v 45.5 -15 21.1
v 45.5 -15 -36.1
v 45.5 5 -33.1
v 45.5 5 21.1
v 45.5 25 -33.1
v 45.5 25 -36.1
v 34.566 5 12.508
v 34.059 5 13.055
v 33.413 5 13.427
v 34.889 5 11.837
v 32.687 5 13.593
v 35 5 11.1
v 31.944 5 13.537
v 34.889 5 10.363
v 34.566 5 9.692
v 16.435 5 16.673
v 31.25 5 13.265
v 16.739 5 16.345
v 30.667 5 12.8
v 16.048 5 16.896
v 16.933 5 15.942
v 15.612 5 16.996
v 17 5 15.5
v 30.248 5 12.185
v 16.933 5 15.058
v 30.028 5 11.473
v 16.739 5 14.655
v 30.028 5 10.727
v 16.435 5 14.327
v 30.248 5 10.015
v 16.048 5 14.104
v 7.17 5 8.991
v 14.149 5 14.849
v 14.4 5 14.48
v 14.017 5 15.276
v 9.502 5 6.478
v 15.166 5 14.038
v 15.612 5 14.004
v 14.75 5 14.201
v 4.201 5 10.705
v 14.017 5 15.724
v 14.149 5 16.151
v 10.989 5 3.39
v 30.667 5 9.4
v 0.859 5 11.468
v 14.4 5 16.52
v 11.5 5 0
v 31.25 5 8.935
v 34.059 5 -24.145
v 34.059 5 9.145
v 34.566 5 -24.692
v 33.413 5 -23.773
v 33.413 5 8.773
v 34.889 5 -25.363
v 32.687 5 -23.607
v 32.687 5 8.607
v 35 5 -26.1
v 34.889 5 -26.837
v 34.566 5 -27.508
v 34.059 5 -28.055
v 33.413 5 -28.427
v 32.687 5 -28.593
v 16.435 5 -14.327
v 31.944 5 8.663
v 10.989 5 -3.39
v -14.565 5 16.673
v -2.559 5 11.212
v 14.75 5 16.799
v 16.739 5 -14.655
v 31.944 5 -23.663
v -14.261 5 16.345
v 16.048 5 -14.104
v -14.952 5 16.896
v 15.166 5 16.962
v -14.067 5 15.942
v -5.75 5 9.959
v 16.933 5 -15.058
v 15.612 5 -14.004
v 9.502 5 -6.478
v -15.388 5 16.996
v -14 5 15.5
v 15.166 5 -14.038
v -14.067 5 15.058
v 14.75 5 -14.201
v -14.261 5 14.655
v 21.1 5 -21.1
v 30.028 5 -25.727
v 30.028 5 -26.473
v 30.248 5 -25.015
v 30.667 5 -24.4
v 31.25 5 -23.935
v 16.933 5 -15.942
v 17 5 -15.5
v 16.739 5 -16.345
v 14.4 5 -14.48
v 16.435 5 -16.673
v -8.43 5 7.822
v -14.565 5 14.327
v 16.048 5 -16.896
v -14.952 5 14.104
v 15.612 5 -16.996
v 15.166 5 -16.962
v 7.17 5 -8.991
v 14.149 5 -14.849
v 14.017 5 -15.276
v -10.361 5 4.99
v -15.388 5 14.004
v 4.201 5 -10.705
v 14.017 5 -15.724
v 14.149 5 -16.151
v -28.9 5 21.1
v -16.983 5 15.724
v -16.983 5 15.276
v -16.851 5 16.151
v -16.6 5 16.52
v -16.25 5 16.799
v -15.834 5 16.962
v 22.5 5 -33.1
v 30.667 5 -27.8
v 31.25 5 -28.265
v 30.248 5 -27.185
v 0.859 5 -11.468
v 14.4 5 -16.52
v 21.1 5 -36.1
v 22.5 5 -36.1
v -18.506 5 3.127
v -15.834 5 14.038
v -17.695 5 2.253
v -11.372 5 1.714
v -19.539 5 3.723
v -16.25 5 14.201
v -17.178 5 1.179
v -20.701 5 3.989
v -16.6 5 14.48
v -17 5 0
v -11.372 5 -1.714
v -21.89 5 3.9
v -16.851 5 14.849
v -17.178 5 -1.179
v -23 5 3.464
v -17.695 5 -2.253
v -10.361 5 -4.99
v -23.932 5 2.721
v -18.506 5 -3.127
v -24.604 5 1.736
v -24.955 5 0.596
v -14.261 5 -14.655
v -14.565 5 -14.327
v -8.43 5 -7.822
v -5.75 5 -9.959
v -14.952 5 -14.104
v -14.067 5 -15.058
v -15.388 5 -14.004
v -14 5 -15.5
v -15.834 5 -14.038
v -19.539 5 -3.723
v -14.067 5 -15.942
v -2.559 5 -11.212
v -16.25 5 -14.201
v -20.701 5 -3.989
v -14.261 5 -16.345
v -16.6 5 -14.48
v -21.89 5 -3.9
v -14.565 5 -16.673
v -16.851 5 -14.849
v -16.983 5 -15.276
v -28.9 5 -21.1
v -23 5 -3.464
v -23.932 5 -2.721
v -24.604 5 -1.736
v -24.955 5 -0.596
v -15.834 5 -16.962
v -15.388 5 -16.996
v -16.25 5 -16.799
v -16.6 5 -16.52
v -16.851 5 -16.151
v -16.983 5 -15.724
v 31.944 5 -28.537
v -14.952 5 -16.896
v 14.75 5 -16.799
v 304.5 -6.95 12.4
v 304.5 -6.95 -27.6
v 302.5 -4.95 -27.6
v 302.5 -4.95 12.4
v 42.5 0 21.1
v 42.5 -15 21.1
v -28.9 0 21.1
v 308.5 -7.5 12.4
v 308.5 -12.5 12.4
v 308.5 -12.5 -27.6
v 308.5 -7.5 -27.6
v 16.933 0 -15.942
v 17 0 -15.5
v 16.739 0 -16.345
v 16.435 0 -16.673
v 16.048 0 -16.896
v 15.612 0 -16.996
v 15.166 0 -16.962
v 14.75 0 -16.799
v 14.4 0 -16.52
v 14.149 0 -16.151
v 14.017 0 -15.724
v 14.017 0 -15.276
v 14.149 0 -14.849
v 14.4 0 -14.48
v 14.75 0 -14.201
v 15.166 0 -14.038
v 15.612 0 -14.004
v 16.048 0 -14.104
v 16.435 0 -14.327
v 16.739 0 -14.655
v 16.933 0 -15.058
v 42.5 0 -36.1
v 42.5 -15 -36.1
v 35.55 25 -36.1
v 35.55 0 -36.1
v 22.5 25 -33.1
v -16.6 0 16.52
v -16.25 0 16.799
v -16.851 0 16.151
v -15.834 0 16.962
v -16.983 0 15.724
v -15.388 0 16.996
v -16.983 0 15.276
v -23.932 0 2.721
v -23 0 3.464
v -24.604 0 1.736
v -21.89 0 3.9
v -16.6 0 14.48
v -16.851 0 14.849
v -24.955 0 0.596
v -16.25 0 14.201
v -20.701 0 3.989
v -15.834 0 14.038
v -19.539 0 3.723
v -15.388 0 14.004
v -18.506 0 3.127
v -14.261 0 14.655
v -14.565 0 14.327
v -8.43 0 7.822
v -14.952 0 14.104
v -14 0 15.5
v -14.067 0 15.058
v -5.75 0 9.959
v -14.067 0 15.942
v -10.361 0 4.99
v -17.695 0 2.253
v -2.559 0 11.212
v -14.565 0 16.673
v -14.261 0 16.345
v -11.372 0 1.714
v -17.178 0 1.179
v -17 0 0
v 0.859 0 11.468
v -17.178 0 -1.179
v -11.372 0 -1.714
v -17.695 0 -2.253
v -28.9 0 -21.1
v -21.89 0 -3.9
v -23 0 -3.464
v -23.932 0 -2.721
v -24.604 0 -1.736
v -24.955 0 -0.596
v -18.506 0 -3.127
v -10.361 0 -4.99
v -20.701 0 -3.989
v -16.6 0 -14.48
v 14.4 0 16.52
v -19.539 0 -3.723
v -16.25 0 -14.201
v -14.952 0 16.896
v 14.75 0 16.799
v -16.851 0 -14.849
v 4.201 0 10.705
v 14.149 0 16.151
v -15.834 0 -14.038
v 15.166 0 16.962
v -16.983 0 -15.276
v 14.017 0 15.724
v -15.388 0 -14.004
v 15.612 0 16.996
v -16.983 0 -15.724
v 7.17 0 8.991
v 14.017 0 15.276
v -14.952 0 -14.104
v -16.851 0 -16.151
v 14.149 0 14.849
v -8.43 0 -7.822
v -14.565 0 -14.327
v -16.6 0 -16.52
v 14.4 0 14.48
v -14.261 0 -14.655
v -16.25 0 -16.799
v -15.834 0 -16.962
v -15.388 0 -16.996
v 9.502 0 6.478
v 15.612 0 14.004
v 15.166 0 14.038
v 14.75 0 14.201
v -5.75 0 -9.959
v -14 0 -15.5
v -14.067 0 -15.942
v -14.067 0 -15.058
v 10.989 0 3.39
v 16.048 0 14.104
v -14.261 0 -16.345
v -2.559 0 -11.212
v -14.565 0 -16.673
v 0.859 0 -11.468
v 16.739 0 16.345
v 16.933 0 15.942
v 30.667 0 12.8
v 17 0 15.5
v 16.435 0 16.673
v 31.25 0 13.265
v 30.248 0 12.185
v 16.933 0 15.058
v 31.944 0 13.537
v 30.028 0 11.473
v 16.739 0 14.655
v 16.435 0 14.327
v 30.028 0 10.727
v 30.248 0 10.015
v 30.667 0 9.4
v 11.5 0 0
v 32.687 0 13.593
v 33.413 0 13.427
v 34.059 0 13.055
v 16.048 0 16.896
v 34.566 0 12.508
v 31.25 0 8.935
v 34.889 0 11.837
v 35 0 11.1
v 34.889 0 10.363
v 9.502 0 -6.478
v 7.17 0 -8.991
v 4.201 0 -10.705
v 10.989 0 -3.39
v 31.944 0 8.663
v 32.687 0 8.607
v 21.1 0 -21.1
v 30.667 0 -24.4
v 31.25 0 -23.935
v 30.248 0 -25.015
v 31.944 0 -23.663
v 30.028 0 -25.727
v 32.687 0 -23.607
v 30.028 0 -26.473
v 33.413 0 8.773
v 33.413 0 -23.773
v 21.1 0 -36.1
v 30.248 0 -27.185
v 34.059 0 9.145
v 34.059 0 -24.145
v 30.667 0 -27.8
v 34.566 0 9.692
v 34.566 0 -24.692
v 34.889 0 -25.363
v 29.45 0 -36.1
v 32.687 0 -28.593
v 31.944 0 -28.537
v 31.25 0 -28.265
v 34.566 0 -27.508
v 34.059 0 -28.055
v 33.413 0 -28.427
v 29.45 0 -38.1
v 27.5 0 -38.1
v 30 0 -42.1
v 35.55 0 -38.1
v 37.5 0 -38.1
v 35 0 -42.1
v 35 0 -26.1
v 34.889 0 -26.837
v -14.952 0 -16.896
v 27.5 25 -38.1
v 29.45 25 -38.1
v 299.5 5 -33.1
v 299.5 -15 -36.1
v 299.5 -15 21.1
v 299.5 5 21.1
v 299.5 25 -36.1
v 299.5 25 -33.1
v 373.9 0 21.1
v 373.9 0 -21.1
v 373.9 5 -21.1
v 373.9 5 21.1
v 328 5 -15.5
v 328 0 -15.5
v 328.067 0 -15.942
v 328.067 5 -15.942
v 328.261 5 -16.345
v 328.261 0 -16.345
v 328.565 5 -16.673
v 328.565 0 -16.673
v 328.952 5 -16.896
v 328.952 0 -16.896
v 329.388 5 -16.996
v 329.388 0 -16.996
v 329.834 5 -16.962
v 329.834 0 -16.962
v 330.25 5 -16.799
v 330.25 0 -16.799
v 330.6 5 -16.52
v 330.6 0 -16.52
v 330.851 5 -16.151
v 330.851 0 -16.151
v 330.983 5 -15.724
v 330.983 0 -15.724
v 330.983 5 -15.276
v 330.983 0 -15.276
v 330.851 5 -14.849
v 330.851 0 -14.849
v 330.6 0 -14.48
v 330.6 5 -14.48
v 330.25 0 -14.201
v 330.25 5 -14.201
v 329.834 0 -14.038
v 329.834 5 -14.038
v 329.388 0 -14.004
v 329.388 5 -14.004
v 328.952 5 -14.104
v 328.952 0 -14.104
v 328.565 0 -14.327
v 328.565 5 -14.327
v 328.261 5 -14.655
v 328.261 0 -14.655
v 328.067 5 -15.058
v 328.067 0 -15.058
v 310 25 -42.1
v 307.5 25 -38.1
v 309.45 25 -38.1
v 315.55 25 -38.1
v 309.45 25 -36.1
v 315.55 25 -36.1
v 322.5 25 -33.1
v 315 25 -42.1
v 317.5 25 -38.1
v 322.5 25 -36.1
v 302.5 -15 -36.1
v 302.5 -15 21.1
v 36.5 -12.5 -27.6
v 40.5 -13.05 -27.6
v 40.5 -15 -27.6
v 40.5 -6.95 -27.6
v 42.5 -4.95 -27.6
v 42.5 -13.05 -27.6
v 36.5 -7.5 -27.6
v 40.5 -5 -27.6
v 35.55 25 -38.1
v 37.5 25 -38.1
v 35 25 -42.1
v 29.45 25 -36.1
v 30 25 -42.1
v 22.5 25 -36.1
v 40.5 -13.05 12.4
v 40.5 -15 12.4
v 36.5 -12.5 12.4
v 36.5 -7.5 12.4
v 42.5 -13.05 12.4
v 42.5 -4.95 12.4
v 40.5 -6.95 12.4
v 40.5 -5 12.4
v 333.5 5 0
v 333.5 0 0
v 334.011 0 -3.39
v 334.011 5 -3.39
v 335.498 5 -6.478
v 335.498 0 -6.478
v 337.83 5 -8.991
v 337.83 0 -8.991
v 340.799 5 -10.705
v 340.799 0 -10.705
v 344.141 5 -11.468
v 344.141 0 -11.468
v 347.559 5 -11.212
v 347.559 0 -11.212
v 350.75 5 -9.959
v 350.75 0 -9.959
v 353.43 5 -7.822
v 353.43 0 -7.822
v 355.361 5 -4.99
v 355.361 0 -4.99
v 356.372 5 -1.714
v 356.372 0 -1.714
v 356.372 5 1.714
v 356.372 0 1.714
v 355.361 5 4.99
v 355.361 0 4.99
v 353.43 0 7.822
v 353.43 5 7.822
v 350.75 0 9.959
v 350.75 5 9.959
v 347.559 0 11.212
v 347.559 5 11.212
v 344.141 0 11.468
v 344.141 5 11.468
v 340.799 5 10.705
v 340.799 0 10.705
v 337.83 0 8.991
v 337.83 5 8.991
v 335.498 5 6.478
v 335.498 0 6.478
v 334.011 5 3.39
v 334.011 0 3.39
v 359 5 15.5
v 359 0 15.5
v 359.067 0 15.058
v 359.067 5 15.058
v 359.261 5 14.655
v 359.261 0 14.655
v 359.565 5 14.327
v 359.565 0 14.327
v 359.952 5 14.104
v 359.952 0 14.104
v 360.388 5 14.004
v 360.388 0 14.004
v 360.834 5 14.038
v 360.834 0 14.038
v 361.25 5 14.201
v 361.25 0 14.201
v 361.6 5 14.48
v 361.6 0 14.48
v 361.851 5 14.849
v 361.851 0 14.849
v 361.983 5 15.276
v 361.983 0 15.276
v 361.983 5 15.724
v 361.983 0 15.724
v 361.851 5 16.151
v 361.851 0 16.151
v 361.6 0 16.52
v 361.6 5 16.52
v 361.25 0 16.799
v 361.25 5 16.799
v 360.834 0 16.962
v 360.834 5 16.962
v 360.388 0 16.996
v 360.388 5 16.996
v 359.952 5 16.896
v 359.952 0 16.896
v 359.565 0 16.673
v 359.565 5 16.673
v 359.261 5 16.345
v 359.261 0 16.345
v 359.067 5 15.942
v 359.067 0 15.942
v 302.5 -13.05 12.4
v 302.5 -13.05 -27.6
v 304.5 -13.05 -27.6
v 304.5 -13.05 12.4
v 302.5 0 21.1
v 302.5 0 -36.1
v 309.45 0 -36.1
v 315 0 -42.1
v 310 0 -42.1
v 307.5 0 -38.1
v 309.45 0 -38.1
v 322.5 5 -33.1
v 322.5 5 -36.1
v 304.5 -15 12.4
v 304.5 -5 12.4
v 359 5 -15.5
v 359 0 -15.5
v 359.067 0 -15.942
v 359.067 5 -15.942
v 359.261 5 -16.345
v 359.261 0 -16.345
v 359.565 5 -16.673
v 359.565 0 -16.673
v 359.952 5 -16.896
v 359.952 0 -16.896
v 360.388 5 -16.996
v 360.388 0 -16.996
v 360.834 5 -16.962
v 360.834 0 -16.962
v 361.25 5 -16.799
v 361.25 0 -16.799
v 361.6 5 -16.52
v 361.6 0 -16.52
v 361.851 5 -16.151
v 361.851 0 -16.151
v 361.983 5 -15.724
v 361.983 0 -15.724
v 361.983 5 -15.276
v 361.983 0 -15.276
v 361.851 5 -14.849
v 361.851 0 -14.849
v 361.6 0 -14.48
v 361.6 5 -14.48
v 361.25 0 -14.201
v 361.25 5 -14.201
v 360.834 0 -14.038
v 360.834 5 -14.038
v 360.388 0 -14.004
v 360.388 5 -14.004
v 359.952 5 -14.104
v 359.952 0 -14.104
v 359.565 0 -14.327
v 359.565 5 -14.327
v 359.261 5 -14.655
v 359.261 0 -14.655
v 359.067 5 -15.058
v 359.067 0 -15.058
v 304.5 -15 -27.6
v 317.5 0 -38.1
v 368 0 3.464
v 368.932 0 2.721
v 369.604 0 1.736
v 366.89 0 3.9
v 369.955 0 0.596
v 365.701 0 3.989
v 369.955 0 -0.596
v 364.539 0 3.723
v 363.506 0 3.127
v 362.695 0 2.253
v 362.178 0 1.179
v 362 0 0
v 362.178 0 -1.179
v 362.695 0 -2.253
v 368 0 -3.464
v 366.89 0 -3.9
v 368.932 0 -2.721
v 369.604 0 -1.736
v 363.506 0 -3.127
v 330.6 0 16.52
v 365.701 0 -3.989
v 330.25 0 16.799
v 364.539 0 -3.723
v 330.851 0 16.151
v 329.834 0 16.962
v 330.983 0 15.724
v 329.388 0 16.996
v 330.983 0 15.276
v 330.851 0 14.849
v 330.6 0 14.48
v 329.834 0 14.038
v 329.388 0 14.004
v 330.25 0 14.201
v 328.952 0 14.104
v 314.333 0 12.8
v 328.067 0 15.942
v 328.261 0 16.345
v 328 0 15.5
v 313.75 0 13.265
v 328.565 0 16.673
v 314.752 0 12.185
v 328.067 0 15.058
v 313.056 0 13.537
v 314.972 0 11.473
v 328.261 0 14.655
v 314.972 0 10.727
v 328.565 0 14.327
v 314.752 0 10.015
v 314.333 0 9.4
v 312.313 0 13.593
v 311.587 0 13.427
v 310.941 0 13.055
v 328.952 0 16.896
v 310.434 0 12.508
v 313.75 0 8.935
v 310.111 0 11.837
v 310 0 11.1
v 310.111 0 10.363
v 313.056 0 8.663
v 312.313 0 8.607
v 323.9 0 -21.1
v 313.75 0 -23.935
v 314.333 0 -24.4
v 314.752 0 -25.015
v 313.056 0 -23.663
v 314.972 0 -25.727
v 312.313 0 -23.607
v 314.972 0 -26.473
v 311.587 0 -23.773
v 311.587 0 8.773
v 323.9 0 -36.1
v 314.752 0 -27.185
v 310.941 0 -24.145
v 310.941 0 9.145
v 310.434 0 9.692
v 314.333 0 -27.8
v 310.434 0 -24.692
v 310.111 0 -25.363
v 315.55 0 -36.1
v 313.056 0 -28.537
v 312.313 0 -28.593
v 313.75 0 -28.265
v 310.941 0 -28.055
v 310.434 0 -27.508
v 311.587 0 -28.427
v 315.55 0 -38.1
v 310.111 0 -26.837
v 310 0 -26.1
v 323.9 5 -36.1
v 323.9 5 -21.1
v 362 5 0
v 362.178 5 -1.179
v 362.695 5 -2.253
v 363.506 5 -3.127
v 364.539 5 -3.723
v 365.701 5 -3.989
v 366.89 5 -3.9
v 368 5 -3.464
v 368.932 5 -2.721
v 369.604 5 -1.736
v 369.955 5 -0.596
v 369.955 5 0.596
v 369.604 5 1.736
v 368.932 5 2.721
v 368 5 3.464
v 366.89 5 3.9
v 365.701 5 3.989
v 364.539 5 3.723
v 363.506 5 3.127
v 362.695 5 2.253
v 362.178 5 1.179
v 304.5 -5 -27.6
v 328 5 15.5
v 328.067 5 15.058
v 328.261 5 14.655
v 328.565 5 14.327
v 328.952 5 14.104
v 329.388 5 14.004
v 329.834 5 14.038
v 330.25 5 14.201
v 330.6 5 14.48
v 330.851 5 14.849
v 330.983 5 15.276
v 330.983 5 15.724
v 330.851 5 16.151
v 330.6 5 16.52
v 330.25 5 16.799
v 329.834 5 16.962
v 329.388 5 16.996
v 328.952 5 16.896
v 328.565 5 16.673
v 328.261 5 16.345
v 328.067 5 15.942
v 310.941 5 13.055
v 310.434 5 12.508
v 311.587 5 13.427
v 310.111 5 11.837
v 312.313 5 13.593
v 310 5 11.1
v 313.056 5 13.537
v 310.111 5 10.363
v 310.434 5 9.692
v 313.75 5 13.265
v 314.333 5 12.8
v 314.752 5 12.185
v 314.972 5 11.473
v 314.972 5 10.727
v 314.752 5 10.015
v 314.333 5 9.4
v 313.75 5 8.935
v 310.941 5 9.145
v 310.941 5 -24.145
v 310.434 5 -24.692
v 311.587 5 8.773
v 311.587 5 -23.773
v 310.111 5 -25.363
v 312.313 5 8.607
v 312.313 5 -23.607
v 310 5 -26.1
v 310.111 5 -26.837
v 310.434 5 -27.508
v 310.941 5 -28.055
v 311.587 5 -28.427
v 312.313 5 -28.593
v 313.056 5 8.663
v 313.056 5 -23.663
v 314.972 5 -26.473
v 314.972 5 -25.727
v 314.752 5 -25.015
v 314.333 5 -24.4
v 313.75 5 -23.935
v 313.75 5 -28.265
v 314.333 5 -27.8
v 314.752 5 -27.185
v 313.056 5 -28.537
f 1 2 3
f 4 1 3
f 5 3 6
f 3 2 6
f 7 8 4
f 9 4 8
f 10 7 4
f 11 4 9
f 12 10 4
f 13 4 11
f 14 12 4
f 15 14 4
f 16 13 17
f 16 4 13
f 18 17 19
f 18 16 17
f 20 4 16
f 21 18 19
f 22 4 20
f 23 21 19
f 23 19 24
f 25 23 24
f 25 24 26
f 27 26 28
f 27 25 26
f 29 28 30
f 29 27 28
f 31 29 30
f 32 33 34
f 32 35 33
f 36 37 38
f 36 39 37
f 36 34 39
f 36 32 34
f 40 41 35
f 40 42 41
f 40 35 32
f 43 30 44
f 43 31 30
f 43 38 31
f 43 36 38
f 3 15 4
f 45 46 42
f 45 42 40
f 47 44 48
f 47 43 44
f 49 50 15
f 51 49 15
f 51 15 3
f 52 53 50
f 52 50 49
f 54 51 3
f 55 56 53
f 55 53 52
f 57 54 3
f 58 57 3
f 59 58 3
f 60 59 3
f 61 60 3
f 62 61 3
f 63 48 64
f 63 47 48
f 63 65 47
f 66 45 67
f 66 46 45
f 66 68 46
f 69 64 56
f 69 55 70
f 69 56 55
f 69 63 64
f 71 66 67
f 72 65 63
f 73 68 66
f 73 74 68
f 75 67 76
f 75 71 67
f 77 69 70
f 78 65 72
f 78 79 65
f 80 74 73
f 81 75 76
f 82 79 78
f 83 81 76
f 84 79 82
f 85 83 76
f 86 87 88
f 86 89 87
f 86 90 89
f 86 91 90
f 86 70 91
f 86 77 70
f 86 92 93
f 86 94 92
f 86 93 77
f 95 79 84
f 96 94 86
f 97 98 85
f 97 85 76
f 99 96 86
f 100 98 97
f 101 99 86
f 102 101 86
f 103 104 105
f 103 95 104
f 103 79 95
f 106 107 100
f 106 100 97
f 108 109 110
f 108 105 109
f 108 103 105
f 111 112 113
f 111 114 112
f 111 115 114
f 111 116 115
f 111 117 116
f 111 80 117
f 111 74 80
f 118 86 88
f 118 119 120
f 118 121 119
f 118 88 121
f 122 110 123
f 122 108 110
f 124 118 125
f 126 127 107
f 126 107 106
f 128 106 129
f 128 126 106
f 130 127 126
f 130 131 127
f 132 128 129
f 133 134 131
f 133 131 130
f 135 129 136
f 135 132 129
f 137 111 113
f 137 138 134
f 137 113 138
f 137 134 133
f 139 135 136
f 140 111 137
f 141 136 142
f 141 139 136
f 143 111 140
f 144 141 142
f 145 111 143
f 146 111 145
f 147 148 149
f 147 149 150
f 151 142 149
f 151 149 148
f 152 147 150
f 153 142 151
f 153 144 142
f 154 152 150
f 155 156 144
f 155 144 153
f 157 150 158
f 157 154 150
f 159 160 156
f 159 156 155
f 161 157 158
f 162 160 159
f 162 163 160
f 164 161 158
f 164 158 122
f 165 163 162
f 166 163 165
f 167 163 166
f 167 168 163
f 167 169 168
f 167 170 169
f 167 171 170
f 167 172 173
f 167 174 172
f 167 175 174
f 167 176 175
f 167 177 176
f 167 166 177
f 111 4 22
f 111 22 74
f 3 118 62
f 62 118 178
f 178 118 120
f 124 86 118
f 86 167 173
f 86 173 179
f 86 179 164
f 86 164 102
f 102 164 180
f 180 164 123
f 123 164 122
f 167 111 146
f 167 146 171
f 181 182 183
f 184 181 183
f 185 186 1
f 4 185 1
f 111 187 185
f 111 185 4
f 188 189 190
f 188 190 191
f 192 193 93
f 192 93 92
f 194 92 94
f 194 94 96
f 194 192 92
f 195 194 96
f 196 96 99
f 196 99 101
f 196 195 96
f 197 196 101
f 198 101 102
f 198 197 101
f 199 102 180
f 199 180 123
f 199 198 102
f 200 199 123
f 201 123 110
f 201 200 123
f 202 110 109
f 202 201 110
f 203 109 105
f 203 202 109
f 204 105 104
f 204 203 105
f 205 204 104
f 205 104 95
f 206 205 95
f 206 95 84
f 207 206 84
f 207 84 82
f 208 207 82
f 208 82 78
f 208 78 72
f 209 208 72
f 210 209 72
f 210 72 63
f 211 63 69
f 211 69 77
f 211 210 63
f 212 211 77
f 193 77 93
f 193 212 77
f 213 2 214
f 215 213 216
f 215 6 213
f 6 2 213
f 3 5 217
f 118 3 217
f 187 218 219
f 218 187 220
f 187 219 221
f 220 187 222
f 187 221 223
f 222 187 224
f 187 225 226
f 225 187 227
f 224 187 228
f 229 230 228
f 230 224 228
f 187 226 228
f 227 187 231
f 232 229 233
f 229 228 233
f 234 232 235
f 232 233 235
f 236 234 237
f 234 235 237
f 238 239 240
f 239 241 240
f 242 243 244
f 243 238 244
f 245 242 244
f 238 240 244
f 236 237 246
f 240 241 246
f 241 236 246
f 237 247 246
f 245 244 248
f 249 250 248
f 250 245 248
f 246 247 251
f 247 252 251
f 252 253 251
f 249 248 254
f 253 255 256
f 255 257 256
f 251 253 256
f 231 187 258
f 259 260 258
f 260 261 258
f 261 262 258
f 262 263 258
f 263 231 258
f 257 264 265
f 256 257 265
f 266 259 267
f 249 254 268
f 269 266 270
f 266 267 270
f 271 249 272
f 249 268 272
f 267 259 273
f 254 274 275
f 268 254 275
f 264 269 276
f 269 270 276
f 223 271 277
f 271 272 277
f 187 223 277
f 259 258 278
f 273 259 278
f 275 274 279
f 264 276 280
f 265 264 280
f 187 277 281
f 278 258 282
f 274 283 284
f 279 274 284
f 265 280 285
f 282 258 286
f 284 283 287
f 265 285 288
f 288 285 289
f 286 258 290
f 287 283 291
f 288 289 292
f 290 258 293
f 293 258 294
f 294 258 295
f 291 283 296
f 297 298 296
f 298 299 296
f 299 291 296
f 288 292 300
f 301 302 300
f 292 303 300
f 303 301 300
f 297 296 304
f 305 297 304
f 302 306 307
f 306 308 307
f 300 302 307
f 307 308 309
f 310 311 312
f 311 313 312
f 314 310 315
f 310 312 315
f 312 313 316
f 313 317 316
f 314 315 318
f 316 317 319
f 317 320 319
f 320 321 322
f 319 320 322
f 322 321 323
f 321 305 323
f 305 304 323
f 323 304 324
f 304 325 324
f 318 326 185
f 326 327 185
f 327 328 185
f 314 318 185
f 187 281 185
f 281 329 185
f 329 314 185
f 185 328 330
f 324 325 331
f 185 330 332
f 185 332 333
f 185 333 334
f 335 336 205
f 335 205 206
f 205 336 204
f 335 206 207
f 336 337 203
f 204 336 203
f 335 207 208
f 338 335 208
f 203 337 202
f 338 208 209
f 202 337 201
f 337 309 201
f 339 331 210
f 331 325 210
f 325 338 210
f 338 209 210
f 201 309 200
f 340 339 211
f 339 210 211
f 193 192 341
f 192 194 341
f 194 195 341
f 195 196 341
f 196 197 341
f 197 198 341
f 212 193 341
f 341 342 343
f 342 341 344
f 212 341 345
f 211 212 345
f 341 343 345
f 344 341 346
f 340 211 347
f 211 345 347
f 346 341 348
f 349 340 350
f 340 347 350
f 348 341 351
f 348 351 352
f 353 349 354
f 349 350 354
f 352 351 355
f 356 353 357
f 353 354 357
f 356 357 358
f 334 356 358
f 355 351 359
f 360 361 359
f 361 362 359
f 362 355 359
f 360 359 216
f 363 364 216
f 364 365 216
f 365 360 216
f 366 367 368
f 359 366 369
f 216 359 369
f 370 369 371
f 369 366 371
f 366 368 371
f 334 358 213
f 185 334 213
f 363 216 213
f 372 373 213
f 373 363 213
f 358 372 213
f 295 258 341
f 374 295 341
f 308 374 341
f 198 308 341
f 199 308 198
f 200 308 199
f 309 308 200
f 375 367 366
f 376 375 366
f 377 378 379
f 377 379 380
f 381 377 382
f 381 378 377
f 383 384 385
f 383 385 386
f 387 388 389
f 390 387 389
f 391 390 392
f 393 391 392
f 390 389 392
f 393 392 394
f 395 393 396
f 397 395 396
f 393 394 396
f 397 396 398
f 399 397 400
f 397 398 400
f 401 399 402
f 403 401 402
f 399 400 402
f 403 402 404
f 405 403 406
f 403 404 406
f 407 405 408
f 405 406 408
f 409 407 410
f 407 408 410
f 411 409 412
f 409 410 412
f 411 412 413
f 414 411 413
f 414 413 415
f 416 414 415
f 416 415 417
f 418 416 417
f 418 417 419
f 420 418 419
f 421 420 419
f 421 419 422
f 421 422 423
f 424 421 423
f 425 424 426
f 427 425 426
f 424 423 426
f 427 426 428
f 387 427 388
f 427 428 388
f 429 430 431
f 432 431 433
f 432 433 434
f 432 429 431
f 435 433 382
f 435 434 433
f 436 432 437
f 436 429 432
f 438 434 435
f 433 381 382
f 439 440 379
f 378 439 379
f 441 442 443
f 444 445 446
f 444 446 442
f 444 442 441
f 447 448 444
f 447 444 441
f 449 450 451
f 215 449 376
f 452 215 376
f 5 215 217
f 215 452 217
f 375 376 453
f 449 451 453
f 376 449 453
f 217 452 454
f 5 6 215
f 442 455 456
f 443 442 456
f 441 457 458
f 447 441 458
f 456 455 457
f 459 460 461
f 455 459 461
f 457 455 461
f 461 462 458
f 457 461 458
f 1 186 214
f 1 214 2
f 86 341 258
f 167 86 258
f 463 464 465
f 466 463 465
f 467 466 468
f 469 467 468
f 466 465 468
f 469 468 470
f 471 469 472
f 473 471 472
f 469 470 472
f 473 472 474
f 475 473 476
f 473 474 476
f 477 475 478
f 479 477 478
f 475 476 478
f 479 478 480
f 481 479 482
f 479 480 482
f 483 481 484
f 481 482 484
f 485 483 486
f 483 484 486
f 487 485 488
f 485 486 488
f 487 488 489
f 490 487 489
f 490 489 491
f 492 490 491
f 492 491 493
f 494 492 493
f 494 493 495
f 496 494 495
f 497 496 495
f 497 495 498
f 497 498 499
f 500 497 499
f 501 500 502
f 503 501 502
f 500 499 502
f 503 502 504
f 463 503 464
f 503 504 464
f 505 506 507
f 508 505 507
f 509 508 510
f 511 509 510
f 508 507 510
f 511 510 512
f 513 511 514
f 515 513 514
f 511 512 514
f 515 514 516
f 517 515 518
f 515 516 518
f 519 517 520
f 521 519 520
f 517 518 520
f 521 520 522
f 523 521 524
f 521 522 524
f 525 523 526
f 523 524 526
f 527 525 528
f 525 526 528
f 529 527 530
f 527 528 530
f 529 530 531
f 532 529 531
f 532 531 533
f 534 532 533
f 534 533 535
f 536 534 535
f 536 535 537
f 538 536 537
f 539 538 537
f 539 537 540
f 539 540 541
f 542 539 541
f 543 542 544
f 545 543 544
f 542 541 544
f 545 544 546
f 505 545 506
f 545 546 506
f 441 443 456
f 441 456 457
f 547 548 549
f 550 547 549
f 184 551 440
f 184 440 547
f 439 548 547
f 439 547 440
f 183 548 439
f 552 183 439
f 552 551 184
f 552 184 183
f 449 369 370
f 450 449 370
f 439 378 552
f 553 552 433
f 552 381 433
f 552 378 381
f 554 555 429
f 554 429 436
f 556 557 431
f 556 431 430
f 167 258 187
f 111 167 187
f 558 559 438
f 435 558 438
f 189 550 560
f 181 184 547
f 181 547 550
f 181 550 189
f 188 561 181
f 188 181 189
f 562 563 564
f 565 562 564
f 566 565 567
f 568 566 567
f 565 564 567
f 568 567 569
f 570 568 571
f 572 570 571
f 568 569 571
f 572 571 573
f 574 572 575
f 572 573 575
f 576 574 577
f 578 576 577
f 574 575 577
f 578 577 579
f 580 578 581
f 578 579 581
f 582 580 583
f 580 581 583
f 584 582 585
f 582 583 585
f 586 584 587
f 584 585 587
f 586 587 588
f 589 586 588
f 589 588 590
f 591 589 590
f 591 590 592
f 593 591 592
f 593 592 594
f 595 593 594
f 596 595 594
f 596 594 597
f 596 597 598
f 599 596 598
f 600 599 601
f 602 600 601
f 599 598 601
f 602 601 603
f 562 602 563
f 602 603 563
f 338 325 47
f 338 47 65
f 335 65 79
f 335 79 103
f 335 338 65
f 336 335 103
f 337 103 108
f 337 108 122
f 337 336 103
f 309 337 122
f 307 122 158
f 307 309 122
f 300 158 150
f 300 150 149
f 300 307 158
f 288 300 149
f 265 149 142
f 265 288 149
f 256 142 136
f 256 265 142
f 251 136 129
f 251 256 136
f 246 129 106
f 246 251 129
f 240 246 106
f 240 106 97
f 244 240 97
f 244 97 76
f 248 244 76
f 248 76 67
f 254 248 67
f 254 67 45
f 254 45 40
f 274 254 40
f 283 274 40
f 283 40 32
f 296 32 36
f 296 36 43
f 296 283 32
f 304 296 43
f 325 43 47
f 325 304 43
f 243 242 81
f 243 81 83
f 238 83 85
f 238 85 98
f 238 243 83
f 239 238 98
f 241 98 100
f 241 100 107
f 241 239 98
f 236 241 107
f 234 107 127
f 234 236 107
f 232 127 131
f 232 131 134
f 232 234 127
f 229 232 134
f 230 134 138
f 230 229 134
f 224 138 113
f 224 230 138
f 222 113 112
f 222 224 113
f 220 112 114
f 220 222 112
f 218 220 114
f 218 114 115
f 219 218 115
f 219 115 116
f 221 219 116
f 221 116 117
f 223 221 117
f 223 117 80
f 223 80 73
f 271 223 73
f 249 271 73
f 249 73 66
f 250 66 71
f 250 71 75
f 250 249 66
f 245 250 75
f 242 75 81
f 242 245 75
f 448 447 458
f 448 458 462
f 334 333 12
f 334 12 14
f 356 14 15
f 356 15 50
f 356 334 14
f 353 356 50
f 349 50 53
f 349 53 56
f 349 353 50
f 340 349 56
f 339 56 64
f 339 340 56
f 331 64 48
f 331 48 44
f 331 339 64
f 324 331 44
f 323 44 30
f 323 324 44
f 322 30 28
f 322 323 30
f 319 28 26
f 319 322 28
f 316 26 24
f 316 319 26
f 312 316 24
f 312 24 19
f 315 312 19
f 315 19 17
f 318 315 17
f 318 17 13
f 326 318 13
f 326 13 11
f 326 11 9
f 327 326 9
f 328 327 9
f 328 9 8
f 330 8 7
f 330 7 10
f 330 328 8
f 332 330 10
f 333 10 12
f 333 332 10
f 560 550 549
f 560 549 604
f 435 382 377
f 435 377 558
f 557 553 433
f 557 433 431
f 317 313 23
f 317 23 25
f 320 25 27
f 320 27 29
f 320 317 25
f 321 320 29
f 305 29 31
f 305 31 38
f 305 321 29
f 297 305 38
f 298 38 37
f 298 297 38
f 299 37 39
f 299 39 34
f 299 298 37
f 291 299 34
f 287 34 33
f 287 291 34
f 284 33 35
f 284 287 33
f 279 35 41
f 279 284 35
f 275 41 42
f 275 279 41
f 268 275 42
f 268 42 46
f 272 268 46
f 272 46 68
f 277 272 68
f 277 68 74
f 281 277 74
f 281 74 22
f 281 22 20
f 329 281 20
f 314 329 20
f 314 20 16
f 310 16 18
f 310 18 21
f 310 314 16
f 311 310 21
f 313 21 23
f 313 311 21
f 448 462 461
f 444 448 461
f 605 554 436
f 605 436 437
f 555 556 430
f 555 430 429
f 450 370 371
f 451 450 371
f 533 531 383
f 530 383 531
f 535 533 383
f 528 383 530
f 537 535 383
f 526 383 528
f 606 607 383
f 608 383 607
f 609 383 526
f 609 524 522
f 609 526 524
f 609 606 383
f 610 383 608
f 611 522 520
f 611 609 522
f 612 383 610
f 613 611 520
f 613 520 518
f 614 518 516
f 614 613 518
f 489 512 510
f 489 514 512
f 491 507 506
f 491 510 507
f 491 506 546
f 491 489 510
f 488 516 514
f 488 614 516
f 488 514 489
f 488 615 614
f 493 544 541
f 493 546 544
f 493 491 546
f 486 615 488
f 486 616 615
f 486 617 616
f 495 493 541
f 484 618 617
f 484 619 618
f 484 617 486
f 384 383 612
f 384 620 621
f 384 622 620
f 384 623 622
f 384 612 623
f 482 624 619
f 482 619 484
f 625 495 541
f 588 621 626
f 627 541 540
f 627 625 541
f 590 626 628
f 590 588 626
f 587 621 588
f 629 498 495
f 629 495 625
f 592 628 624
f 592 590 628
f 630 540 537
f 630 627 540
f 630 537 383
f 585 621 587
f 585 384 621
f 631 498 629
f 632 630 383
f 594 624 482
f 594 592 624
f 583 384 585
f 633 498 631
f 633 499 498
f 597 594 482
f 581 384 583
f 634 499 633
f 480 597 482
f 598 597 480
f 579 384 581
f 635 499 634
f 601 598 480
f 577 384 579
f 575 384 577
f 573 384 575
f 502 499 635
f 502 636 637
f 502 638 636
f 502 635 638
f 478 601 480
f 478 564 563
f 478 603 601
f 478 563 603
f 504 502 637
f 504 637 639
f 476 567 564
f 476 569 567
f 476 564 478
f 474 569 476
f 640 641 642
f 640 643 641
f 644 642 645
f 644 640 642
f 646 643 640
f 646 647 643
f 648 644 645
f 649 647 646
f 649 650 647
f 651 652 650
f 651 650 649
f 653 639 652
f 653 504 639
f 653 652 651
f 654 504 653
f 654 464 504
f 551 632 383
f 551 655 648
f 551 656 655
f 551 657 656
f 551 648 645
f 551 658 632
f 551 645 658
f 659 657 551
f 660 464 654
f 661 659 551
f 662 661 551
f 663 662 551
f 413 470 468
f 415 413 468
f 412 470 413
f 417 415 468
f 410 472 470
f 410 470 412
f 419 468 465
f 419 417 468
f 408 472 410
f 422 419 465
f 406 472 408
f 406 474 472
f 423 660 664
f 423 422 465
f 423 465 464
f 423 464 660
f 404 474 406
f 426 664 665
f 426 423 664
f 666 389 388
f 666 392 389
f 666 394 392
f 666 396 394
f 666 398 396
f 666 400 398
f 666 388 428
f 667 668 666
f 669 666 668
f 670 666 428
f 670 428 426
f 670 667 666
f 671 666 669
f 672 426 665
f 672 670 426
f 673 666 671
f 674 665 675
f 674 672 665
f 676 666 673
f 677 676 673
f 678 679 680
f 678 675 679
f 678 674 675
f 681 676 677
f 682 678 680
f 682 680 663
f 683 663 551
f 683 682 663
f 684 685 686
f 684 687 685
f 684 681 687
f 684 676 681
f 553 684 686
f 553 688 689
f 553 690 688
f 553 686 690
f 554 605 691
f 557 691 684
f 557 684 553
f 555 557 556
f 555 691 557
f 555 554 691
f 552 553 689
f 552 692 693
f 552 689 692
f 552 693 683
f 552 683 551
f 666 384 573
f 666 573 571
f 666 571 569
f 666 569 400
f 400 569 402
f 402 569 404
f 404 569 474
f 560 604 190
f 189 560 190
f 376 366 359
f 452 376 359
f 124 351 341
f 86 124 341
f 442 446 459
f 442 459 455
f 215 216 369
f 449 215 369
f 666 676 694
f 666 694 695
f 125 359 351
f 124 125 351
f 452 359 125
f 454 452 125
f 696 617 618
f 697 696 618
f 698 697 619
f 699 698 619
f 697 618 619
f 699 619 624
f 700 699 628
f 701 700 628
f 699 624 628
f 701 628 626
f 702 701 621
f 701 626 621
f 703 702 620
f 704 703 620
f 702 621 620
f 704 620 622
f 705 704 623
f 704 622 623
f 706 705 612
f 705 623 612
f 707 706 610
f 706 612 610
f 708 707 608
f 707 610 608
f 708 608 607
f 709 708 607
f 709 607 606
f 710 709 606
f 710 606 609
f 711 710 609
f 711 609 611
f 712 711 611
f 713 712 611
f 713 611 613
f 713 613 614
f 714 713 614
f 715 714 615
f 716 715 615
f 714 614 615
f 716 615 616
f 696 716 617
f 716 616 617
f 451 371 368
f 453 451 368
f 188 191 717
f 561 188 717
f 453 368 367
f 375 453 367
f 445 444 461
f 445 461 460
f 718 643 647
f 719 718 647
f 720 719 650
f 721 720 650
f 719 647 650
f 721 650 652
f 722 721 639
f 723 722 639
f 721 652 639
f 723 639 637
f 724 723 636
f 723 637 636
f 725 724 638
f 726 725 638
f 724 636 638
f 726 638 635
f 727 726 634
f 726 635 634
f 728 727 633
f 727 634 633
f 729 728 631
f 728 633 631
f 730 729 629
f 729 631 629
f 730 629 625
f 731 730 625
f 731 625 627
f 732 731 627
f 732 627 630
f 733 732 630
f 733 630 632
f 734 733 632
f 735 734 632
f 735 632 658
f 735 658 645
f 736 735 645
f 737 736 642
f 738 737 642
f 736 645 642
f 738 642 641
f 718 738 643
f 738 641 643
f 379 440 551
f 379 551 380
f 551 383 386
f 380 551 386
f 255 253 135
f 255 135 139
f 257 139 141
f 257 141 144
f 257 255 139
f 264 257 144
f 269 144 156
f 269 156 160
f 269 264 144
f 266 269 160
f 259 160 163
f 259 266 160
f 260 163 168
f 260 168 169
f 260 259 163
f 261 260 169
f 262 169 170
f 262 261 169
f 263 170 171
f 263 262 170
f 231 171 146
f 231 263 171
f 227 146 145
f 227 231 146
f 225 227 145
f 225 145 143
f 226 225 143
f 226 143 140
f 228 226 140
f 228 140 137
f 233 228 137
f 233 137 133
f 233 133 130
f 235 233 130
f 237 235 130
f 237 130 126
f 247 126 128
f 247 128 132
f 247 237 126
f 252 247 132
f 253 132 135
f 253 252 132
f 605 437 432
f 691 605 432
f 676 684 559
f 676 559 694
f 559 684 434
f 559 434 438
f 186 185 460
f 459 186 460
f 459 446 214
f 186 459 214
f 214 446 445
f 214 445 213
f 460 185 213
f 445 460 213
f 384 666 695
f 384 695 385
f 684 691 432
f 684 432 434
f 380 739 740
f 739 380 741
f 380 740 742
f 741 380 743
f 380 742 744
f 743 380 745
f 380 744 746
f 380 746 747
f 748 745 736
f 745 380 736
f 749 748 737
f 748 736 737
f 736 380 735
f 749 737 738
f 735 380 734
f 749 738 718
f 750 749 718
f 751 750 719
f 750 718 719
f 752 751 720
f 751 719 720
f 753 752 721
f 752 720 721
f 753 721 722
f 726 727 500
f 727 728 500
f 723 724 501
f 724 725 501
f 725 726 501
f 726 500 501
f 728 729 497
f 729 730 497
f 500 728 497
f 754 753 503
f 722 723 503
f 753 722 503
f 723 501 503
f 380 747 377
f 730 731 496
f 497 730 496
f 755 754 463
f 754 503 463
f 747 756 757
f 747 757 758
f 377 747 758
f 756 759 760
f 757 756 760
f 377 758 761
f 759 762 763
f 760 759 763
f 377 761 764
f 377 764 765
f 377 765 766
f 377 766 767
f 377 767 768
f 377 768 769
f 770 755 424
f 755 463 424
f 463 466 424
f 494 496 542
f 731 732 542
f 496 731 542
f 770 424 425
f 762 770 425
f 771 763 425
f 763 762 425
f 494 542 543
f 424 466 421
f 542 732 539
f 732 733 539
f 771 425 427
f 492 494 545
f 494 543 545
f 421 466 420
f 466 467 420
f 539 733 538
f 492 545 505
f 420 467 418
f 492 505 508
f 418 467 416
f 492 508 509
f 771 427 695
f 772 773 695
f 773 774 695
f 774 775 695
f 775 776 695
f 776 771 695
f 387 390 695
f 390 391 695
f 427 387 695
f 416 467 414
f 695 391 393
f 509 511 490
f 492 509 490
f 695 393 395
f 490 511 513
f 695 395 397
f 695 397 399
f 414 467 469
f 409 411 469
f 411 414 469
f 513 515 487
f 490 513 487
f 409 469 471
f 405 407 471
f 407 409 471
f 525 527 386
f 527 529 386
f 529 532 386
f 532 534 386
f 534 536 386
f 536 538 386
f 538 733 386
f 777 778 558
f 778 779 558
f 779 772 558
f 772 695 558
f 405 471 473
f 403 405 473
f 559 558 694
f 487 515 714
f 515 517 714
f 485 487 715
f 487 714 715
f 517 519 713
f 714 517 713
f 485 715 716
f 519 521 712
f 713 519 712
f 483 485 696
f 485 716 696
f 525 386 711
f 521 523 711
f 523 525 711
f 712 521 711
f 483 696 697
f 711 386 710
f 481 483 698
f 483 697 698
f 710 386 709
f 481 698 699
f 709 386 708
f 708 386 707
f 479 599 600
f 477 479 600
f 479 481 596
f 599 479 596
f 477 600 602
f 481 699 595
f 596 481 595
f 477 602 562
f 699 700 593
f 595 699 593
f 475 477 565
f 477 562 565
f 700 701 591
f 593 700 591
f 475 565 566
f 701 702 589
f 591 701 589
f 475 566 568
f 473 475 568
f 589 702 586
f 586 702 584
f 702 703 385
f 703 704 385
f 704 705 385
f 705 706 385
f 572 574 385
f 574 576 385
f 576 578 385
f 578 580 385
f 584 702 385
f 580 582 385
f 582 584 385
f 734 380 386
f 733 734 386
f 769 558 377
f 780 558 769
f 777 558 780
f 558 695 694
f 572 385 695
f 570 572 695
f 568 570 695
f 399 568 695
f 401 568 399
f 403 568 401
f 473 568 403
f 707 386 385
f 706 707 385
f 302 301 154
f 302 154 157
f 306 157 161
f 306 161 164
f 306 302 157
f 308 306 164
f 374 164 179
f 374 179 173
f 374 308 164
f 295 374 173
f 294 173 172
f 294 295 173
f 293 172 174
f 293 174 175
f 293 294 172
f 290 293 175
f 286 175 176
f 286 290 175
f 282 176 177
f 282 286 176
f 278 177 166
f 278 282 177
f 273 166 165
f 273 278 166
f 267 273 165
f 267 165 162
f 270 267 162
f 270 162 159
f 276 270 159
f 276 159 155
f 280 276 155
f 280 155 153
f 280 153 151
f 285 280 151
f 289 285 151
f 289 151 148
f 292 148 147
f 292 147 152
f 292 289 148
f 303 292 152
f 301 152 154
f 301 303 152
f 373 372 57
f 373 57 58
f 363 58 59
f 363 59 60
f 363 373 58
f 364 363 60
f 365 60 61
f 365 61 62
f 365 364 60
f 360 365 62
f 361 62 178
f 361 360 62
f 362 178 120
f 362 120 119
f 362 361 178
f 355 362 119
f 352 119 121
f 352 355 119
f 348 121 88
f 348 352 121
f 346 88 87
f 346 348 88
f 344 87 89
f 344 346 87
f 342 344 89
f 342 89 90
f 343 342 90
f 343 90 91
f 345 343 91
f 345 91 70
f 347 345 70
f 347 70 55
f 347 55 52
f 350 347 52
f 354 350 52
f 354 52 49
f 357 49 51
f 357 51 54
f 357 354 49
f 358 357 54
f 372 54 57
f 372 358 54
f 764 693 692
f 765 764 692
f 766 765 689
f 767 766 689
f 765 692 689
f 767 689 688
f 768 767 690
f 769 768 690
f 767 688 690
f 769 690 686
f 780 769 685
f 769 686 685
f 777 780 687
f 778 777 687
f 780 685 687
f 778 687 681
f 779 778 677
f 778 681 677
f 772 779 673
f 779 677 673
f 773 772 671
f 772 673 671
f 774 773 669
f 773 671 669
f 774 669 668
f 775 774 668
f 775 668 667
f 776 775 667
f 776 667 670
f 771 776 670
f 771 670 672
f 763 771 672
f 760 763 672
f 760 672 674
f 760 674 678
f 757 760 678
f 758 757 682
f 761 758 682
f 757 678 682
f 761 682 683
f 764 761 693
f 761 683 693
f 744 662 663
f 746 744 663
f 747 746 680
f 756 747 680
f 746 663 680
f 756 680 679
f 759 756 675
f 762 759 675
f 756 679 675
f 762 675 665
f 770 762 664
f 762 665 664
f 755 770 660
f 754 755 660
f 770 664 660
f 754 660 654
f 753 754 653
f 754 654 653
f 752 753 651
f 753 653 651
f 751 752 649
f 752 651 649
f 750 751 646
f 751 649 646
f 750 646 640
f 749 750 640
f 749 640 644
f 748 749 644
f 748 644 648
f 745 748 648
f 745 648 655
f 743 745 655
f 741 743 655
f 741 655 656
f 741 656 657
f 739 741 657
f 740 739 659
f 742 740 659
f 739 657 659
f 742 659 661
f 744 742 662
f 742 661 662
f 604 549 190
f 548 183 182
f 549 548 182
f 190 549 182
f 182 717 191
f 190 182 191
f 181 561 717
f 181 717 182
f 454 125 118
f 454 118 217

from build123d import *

# Parameters (mm, degrees)
SKETCH1_R           = 2.5
SKETCH1_R_2         = 1.5
SKETCH1_R_3         = 4
SKETCH1_R_4         = 11.5
BOSS_EXTRUDE1_DEPTH = 5
SKETCH2_W           = 57.2
SKETCH2_H           = 23
BOSS_EXTRUDE2_DEPTH = 3
BOSS_EXTRUDE3_START = -8.5
BOSS_EXTRUDE3_DEPTH = 40
SKETCH5_W           = 3
SKETCH5_H           = 3
CUT_EXTRUDE1_DEPTH  = 58.2
SKETCH6_W           = 23
SKETCH6_H           = 20
BOSS_EXTRUDE4_DEPTH = 3
BOSS_EXTRUDE5_START = -25
BOSS_EXTRUDE5_DEPTH = 25


with BuildPart() as part:
    # Sketch1 → Boss-Extrude1 (new body)
    with BuildSketch(Plane(origin=(0, 0, 0), x_dir=(1, 0, 0), z_dir=(0, 1, 0))):
        Polygon((42.5, 36.1), (21.1, 36.1), (21.1, 21.1), (21.1, -21.1), (42.5, -21.1), align=None)
        with Locations((32.5, -11.1)):
            Circle(SKETCH1_R, mode=Mode.SUBTRACT)
        with Locations((32.5, 26.1)):
            Circle(SKETCH1_R, mode=Mode.SUBTRACT)
        Polygon((-21.1, -21.1), (21.1, -21.1), (21.1, 21.1), (-21.1, 21.1), (-28.9, 21.1), (-28.9, -21.1), align=None)
        with Locations((-15.5, -15.5)):
            Circle(SKETCH1_R_2, mode=Mode.SUBTRACT)
        with Locations((-21, 0)):
            Circle(SKETCH1_R_3, mode=Mode.SUBTRACT)
        Circle(SKETCH1_R_4, mode=Mode.SUBTRACT)
        with Locations((15.5, -15.5)):
            Circle(SKETCH1_R_2, mode=Mode.SUBTRACT)
        with Locations((-15.5, 15.5)):
            Circle(SKETCH1_R_2, mode=Mode.SUBTRACT)
        with Locations((15.5, 15.5)):
            Circle(SKETCH1_R_2, mode=Mode.SUBTRACT)
    extrude(amount=BOSS_EXTRUDE1_DEPTH)

    # Sketch2 → Boss-Extrude2 (add)
    with BuildSketch(Plane(origin=(42.5, 0, 0), x_dir=(0, 0, -1), z_dir=(1, 0, 0))):
        with Locations((7.5, -6.5)):
            Rectangle(SKETCH2_W, SKETCH2_H)
    extrude(amount=BOSS_EXTRUDE2_DEPTH)

    # Sketch4 → Boss-Extrude3 (add)
    with BuildSketch(Plane(origin=(0, 0, -36.1), x_dir=(-1, 0, 0), z_dir=(0, 0, -1)).offset(BOSS_EXTRUDE3_START)):
        Polygon((-36.5, -7.5), (-40.5, -5), (-40.5, -6.95), (-42.5, -4.95), (-42.5, -13.05), (-40.5, -13.05), (-40.5, -15), (-36.5, -12.5), align=None)
    extrude(amount=-BOSS_EXTRUDE3_DEPTH)

    # Sketch5 → Cut-Extrude1 (cut, through all)
    with BuildSketch(Plane.XY.offset(21.1)):
        with Locations((44, -16.5)):
            Rectangle(SKETCH5_W, SKETCH5_H)
    extrude(amount=-CUT_EXTRUDE1_DEPTH, mode=Mode.SUBTRACT)

    # Sketch6 → Boss-Extrude4 (add)
    with BuildSketch(Plane(origin=(0, 0, -36.1), x_dir=(-1, 0, 0), z_dir=(0, 0, -1))):
        with Locations((-34, 15)):
            Rectangle(SKETCH6_W, SKETCH6_H)
    extrude(amount=-BOSS_EXTRUDE4_DEPTH)

    # Sketch7 → Boss-Extrude5 (add)
    with BuildSketch(Plane(origin=(0, 25, 0), x_dir=(1, 0, 0), z_dir=(0, 1, 0)).offset(BOSS_EXTRUDE5_START)):
        Polygon((35, 42.1), (30, 42.1), (27.5, 38.1), (29.45, 38.1), (29.45, 36.1), (32.5, 36.1), (35.55, 36.1), (35.55, 38.1), (37.5, 38.1), align=None)
    extrude(amount=BOSS_EXTRUDE5_DEPTH)


with BuildPart() as body_2:
    # Mirror1: mirrored copy
    add(part.part.mirror(Plane.ZY.offset(-172.5)))


solid = Compound([part.part, body_2.part])
